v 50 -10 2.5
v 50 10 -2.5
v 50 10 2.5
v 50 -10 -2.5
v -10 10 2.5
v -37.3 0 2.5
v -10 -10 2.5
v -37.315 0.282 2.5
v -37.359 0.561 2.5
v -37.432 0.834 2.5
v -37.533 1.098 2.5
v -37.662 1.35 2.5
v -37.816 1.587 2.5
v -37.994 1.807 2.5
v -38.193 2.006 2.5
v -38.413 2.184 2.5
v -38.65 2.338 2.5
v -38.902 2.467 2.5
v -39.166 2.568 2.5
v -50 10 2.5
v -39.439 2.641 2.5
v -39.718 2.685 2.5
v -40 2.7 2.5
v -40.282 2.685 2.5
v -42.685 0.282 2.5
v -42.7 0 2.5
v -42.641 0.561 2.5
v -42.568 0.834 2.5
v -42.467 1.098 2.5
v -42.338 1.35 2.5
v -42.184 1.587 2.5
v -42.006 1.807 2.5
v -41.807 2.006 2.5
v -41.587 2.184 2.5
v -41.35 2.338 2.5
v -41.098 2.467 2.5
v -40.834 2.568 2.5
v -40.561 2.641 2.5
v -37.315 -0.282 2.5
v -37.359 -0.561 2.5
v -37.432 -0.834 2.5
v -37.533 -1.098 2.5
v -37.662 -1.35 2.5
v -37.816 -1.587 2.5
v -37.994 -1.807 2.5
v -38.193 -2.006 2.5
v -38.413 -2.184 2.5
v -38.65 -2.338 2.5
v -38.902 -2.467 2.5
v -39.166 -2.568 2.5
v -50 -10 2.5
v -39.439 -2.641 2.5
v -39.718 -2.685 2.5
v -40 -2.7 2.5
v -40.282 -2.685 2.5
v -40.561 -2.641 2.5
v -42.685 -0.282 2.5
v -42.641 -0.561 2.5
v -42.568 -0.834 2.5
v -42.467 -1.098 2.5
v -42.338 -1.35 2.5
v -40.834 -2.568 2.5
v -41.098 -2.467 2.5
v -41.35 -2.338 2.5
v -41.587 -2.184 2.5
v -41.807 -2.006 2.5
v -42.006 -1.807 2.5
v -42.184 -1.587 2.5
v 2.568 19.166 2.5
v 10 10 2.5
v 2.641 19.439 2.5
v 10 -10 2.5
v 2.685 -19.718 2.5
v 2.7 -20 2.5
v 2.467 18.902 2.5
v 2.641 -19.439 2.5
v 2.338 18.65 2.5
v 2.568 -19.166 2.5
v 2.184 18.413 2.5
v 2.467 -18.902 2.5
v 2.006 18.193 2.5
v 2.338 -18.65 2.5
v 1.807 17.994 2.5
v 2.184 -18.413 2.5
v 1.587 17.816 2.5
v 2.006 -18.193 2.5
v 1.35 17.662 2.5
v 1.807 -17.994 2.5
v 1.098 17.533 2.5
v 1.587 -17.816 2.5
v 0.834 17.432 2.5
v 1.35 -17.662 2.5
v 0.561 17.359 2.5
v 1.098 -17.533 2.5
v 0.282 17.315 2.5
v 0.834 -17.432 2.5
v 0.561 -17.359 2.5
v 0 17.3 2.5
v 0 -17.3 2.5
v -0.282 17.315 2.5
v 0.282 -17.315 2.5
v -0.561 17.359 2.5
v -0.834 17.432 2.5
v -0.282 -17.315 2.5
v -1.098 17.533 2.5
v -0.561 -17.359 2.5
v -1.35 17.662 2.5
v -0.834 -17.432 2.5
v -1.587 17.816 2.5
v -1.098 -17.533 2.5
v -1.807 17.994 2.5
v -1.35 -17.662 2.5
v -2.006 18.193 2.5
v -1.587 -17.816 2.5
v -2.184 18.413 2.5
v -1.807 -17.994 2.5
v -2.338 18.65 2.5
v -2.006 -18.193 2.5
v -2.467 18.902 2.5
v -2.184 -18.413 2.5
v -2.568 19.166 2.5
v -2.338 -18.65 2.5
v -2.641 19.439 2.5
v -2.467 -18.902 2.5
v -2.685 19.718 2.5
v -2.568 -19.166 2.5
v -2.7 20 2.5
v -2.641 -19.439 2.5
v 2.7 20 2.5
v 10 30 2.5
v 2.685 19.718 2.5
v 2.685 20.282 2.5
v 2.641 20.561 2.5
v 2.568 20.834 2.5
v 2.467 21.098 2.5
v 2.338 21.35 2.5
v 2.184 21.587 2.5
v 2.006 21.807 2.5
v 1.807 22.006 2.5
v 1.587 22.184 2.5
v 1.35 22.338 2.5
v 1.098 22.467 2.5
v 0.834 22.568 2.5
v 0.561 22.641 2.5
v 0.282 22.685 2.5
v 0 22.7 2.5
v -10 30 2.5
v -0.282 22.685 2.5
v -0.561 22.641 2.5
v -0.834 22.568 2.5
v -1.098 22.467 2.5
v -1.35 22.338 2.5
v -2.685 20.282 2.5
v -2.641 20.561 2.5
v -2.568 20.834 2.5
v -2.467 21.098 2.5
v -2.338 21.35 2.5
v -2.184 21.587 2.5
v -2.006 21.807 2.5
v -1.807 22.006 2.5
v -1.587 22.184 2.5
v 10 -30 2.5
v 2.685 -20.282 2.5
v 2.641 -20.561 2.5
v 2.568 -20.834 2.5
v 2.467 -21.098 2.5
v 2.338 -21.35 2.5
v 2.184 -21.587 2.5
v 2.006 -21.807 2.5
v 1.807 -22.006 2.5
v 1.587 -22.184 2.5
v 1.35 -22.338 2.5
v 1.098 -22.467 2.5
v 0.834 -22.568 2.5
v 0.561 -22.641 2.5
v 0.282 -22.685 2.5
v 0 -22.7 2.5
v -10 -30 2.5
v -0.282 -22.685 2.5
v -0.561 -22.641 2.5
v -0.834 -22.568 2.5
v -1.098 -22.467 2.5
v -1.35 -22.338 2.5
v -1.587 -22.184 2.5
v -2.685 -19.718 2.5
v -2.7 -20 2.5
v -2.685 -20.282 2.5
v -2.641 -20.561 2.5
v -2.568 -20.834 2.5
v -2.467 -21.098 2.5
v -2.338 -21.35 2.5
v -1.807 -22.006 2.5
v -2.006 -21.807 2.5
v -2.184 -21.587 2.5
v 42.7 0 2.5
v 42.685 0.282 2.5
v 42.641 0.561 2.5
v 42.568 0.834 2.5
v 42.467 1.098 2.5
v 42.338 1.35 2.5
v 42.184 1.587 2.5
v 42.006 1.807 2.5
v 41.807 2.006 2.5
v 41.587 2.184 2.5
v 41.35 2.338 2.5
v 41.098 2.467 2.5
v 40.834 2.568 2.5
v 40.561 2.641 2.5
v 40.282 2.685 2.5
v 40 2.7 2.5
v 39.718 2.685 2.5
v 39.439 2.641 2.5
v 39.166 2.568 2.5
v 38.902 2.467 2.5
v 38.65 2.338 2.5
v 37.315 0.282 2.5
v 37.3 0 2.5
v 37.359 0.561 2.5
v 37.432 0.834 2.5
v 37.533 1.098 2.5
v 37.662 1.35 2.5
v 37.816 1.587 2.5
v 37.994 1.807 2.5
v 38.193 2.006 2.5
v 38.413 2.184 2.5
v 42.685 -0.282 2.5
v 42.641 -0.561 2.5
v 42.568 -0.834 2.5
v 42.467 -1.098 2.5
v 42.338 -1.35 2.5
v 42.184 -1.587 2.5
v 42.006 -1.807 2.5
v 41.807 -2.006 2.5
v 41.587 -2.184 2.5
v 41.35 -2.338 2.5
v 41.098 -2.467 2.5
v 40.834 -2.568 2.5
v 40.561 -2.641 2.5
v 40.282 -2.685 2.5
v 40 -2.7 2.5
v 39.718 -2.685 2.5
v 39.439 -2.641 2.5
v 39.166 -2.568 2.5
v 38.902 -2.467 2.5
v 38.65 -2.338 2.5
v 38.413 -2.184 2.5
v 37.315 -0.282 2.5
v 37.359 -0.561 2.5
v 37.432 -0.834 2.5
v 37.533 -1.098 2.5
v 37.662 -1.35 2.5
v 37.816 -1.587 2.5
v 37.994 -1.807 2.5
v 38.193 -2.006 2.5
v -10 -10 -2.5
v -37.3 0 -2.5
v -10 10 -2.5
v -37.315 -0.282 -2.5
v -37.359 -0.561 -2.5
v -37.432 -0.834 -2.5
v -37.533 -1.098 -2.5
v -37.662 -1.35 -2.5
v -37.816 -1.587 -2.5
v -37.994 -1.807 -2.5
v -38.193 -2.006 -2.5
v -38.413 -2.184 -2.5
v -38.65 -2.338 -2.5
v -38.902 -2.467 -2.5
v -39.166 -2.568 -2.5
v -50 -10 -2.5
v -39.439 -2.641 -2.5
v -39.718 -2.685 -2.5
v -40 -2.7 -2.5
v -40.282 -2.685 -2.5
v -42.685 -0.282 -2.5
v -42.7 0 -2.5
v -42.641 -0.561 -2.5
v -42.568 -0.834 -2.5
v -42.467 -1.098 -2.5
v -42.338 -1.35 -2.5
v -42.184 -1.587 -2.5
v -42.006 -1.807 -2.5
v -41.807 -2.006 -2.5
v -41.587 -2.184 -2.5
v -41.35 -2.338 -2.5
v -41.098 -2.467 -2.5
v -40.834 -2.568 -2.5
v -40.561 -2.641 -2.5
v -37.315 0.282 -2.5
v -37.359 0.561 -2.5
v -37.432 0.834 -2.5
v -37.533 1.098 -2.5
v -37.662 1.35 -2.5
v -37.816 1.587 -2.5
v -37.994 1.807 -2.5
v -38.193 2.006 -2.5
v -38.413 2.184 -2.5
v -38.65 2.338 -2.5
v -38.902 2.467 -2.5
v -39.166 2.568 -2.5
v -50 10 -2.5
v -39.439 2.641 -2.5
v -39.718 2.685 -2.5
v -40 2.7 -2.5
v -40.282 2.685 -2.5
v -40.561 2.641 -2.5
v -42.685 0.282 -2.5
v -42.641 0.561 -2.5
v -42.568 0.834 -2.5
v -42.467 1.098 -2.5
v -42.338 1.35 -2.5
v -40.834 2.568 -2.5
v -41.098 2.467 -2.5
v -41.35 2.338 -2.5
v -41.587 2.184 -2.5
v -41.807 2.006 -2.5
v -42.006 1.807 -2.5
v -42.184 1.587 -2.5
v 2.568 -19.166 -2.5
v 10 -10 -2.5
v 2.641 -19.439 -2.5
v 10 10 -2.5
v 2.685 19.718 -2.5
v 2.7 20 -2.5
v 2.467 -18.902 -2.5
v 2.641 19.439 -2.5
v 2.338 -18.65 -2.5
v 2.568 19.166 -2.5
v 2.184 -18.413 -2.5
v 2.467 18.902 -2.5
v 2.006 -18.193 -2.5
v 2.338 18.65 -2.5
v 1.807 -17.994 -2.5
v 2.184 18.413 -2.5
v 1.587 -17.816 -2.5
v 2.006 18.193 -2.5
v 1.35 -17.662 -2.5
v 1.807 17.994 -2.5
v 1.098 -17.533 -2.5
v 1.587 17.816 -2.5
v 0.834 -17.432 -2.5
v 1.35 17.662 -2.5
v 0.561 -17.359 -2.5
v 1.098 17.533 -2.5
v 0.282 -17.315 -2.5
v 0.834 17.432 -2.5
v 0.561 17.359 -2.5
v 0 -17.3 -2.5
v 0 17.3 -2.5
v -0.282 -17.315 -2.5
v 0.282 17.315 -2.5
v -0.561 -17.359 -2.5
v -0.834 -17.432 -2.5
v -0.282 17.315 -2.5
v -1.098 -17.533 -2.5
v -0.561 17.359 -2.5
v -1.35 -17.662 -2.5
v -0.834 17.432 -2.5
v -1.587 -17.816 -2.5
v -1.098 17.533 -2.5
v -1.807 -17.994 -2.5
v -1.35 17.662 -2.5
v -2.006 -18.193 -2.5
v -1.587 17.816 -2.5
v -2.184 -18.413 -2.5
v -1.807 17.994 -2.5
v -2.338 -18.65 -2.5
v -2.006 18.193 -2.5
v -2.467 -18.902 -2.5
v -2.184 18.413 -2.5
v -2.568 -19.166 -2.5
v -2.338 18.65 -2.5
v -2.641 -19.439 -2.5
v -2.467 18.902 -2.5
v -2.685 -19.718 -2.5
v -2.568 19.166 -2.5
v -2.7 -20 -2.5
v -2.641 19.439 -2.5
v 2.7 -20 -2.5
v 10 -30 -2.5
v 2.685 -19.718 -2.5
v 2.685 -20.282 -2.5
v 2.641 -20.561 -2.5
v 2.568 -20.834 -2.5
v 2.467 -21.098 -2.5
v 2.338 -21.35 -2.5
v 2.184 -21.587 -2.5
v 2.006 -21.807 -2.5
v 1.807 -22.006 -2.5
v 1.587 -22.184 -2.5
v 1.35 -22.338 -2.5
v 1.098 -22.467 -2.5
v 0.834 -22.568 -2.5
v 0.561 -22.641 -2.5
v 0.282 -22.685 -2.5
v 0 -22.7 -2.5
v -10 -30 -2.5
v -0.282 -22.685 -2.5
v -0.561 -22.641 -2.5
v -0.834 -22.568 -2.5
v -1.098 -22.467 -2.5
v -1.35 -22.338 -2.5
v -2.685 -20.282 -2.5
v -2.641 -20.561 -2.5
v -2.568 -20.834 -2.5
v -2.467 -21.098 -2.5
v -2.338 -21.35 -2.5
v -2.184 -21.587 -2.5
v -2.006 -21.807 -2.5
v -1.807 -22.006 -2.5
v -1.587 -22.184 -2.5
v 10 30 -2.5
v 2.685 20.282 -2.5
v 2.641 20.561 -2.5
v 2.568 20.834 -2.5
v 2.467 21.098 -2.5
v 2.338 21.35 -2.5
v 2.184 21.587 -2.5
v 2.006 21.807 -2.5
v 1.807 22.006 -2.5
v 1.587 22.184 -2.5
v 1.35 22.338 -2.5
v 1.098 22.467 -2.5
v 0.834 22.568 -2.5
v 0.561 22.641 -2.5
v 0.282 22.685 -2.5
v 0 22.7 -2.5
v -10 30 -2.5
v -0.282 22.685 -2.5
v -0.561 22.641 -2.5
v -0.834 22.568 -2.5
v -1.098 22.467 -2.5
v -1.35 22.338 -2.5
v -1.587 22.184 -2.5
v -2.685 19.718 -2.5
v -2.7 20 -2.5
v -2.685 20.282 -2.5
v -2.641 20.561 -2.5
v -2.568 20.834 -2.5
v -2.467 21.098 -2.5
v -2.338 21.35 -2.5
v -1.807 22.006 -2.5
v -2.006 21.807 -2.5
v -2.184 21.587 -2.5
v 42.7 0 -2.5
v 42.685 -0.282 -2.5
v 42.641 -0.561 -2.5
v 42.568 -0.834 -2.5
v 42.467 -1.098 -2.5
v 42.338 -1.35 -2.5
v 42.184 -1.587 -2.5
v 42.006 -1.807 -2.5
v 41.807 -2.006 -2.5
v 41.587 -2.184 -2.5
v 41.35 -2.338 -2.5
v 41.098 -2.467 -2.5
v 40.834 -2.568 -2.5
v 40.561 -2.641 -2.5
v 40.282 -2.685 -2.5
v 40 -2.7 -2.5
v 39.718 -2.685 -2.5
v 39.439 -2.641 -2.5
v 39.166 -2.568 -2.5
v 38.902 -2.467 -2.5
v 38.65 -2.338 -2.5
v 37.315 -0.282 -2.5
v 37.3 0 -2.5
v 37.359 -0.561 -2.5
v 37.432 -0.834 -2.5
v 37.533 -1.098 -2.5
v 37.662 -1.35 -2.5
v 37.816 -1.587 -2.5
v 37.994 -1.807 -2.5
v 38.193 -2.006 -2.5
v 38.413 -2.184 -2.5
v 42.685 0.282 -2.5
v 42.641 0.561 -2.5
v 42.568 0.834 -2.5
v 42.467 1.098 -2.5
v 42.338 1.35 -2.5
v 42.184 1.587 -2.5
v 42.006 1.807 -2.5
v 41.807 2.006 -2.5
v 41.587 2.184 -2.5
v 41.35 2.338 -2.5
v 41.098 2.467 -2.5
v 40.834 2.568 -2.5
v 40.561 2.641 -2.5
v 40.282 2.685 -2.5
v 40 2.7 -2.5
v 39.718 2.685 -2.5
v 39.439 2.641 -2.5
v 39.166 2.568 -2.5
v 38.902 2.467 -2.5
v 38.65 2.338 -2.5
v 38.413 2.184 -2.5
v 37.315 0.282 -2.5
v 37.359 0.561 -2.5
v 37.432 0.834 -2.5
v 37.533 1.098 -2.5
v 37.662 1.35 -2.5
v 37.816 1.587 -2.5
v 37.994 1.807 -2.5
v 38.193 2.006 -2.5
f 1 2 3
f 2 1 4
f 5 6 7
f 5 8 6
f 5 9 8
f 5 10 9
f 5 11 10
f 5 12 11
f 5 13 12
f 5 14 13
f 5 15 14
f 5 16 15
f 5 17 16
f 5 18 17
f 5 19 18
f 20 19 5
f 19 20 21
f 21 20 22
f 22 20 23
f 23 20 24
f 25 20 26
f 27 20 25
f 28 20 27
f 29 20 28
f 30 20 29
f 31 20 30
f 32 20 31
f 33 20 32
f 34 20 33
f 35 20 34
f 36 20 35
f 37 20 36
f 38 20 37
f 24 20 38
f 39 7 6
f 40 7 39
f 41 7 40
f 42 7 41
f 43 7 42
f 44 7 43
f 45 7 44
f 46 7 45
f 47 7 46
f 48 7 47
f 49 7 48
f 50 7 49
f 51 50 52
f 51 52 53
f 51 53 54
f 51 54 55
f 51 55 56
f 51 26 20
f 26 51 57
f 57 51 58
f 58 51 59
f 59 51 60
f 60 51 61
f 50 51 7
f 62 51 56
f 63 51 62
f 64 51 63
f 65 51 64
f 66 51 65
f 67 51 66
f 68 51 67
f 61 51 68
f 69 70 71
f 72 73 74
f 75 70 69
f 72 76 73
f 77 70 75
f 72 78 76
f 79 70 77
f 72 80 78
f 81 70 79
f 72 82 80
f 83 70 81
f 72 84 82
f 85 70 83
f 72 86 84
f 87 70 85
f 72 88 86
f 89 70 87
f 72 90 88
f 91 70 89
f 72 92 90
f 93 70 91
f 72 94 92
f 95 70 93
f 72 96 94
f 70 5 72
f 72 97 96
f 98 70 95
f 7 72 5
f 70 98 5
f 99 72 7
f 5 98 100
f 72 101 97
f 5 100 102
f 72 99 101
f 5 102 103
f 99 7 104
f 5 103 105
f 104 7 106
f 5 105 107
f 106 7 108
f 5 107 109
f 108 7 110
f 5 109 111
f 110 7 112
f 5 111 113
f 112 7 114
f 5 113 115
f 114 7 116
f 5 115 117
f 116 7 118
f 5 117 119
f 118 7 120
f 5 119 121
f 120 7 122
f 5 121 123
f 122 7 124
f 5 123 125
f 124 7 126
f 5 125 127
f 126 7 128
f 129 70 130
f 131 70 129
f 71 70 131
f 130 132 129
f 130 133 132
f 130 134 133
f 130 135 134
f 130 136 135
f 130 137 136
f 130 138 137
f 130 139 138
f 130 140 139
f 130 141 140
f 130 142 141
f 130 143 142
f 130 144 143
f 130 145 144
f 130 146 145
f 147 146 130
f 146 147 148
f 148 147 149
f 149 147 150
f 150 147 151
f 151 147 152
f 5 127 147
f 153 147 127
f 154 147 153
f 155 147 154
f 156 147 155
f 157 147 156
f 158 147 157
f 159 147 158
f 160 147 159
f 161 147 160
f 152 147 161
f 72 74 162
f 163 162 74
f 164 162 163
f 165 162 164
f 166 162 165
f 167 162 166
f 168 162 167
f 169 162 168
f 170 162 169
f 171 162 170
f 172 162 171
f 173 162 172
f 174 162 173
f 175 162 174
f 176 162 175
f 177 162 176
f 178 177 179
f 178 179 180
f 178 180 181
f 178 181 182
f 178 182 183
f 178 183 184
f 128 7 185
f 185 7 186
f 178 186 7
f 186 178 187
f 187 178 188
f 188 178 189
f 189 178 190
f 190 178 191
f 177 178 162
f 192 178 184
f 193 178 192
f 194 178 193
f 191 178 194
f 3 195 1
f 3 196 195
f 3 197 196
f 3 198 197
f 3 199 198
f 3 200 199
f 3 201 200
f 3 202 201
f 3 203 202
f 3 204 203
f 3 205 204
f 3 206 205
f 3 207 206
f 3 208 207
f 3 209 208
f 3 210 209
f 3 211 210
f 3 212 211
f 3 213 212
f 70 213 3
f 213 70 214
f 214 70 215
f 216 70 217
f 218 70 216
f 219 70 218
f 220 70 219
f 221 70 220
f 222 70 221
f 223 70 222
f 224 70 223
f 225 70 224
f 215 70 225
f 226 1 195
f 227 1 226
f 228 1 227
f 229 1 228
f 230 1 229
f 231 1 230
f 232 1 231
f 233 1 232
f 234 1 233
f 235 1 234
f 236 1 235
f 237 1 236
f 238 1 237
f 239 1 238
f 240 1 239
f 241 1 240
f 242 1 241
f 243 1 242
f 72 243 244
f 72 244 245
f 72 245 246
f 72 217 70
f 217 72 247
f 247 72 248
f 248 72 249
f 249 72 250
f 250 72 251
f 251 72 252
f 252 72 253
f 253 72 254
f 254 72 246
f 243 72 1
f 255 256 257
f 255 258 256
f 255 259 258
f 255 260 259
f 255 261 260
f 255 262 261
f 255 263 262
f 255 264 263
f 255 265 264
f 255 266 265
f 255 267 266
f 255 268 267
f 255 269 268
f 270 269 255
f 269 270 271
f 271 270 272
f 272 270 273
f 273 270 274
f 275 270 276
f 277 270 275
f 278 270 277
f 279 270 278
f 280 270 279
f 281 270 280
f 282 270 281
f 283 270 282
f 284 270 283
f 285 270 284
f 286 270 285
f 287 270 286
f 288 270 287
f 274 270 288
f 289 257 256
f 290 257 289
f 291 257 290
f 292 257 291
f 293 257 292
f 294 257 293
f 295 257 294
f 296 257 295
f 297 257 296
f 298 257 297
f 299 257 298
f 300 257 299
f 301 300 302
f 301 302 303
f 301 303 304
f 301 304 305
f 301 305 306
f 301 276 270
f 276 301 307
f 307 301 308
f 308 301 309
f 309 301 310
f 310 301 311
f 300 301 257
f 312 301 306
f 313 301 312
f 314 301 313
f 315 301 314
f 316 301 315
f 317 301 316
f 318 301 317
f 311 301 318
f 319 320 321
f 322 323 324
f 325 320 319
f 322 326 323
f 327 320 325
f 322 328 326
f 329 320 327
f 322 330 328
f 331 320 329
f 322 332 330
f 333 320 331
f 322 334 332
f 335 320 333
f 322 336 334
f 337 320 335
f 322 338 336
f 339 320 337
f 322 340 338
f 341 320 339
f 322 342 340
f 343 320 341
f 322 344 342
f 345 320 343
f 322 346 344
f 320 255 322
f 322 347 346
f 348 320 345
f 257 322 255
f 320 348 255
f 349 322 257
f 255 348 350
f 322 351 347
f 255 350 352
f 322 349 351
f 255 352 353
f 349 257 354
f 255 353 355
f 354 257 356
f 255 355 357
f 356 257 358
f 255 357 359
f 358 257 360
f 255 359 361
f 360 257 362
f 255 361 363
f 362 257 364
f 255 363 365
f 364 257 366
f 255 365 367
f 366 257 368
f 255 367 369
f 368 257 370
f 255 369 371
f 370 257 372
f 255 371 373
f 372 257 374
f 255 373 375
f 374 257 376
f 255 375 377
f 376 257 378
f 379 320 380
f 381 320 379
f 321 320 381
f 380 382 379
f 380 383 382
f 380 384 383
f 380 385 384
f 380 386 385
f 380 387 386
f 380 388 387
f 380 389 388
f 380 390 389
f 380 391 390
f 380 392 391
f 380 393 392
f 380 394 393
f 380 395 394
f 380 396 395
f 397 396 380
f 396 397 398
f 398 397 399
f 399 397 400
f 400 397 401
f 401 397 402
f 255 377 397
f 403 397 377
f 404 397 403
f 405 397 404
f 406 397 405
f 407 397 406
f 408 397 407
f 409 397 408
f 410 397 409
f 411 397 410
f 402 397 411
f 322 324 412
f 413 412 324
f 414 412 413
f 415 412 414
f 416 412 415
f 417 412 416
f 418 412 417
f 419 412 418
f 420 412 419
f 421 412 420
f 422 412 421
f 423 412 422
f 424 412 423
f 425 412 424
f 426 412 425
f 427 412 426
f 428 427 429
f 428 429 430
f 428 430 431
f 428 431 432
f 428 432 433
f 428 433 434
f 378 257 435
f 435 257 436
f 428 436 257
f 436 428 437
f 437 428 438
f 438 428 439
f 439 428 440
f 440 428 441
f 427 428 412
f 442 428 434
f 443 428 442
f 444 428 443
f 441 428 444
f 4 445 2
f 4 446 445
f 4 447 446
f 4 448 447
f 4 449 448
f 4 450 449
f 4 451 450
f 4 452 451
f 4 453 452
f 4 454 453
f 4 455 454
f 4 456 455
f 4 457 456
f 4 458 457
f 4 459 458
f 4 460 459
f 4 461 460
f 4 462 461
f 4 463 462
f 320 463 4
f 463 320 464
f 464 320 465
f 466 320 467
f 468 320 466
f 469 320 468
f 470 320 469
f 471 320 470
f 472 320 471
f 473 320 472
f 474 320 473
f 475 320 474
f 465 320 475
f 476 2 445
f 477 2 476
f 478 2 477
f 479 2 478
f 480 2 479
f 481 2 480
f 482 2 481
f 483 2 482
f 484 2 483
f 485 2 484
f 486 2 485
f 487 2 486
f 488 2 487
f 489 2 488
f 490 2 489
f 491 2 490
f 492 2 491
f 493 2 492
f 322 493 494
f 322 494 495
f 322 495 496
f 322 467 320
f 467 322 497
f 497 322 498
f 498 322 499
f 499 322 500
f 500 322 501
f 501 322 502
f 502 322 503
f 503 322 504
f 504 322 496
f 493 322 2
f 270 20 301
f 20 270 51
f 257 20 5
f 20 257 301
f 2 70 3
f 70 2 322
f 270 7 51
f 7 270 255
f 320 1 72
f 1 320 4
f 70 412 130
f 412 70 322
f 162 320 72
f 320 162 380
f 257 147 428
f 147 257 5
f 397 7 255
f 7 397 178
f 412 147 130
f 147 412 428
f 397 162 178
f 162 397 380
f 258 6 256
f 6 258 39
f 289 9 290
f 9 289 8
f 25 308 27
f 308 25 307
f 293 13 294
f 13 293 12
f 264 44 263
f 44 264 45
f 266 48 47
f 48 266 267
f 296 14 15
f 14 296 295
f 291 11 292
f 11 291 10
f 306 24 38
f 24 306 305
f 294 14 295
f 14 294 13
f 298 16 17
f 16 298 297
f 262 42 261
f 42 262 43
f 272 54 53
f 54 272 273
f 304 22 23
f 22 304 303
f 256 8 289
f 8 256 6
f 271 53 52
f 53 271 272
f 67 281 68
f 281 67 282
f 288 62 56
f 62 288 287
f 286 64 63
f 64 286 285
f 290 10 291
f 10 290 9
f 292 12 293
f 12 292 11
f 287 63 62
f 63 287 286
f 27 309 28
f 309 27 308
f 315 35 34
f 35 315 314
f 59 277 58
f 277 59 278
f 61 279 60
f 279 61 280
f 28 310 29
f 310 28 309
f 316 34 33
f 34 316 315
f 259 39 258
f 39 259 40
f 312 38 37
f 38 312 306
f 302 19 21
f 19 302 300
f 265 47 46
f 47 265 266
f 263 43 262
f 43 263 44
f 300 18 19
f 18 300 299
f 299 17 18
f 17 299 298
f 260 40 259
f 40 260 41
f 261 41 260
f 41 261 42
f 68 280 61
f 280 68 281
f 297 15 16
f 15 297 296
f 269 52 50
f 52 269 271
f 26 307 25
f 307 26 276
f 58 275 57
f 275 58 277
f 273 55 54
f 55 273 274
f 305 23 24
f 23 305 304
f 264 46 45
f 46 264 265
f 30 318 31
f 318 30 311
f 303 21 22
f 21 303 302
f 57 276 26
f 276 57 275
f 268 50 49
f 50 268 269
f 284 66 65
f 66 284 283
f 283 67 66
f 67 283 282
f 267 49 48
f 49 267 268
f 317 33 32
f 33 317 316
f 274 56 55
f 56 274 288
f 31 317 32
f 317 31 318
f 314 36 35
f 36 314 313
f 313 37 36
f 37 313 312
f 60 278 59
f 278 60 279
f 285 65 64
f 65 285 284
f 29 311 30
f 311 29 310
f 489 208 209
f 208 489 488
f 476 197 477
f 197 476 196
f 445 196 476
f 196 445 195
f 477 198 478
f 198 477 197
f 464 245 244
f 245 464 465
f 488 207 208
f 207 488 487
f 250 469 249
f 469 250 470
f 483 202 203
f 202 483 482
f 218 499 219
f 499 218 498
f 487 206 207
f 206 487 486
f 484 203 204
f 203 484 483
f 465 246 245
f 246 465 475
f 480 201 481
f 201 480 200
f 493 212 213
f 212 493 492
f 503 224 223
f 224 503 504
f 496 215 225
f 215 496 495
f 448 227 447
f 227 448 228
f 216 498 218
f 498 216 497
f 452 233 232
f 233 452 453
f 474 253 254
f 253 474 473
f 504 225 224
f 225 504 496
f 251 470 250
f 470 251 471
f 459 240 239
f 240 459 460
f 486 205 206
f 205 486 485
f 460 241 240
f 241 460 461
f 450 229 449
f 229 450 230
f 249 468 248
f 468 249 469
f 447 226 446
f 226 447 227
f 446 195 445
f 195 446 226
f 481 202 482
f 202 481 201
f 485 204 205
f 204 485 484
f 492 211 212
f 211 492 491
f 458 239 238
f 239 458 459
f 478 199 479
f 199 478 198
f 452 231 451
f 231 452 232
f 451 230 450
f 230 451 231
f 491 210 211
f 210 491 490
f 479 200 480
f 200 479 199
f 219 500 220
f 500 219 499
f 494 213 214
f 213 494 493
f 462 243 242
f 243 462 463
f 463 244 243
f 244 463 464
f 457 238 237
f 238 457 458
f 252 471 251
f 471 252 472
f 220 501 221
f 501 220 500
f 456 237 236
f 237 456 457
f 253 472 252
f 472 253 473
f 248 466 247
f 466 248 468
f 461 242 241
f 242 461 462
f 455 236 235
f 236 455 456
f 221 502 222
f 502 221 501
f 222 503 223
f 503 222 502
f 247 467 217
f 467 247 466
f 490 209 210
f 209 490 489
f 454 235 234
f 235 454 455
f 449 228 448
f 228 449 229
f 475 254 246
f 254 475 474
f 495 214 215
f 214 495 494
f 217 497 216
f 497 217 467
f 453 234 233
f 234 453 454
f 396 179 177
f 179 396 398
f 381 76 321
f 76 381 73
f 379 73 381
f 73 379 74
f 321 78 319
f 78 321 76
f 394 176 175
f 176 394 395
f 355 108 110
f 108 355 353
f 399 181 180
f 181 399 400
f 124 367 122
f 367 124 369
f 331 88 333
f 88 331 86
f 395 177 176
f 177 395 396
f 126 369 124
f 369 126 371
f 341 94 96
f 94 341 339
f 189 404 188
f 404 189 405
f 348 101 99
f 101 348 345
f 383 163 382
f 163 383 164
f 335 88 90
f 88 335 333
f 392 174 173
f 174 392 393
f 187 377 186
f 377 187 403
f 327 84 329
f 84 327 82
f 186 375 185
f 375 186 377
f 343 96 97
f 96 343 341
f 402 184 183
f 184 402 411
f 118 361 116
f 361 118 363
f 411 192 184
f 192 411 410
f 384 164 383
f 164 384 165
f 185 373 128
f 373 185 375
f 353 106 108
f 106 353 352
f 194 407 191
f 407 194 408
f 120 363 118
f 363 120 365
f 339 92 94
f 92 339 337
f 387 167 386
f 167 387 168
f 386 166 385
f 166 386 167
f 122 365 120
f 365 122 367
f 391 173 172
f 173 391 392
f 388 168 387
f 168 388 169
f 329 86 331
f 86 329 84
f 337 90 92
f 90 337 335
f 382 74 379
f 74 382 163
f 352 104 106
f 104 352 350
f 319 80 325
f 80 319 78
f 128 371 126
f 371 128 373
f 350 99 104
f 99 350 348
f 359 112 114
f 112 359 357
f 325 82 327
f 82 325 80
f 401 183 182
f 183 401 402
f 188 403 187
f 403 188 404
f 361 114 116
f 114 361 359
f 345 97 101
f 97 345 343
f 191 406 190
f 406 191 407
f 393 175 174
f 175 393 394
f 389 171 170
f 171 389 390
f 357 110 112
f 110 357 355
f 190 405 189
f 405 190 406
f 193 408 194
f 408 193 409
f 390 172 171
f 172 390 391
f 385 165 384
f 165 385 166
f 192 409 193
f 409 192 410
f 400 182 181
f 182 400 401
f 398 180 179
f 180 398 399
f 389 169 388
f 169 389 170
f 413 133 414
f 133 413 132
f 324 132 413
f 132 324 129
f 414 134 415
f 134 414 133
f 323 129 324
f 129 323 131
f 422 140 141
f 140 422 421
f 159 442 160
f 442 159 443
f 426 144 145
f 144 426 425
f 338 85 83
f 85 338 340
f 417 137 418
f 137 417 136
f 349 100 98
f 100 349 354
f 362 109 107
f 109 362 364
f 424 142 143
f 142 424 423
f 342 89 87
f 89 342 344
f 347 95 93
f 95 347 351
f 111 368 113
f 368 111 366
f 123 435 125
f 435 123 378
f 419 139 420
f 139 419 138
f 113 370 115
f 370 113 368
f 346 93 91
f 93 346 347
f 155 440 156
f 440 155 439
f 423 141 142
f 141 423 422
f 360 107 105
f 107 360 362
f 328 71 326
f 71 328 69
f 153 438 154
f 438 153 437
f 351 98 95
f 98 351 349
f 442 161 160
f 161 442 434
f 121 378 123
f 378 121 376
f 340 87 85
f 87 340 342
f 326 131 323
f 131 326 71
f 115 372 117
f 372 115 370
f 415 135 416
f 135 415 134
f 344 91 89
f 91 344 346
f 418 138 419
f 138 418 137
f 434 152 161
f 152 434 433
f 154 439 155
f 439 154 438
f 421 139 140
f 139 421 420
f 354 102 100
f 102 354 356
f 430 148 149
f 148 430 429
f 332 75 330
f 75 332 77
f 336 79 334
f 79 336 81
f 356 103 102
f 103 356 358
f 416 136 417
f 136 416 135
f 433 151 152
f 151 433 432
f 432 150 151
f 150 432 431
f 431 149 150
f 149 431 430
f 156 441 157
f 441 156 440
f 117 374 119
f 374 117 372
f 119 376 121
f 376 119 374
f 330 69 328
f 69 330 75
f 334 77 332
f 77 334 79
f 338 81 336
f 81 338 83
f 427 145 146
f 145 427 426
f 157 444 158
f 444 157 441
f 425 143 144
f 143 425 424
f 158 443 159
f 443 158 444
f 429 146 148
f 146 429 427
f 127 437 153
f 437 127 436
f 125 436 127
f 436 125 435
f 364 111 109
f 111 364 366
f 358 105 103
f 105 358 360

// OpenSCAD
// T-shaped mounting plate.
$fn = 60;
eps = 0.02;
stem_l = 100;
arm_l = 60;
width = 20;
thickness = 5;
difference() {
    union() { cube([stem_l,width,thickness],center=true); cube([width,arm_l,thickness],center=true); }
    for (p=[[-stem_l/2+10,0],[stem_l/2-10,0],[0,-arm_l/2+10],[0,arm_l/2-10]]) translate([p[0],p[1],-thickness/2-eps]) cylinder(d=5.4,h=thickness+2*eps);
}
